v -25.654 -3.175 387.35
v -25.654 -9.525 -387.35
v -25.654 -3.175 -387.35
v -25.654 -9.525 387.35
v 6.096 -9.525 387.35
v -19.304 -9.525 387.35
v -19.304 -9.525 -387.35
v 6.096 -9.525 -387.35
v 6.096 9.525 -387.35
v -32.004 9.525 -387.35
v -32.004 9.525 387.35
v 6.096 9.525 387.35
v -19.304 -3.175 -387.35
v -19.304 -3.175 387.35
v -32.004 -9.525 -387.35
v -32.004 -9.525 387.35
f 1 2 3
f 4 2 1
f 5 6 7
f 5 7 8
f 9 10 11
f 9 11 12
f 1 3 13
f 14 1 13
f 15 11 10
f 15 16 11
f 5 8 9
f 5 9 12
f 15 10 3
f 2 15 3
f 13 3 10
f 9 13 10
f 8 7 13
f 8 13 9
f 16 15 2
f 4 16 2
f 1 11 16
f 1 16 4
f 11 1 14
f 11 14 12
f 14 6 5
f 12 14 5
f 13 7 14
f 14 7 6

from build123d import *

# Parameters (mm, degrees)
F0_W     = 38.1
F0_H     = 387.35
F1_DEPTH = 9.525
F2_W     = 6.35
F2_H     = 774.7
F3_DEPTH = 6.35


with BuildPart() as f1:
    # F0 (on Front) → F1 (new body, symmetric)
    with BuildSketch(Plane.XZ):
        with Locations((-12.9539953259, 193.675)):
            Rectangle(F0_W, F0_H)
        with Locations((-12.9539953259, -193.675)):
            Rectangle(F0_W, F0_H)
    extrude(amount=F1_DEPTH, both=True)

    # F2 (on face) → F3 (cut)
    with BuildSketch(Plane.XZ.offset(9.525)):
        with Locations((-22.4789953259, 0)):
            Rectangle(F2_W, F2_H)
    extrude(amount=-F3_DEPTH, mode=Mode.SUBTRACT)


solid = f1.part
